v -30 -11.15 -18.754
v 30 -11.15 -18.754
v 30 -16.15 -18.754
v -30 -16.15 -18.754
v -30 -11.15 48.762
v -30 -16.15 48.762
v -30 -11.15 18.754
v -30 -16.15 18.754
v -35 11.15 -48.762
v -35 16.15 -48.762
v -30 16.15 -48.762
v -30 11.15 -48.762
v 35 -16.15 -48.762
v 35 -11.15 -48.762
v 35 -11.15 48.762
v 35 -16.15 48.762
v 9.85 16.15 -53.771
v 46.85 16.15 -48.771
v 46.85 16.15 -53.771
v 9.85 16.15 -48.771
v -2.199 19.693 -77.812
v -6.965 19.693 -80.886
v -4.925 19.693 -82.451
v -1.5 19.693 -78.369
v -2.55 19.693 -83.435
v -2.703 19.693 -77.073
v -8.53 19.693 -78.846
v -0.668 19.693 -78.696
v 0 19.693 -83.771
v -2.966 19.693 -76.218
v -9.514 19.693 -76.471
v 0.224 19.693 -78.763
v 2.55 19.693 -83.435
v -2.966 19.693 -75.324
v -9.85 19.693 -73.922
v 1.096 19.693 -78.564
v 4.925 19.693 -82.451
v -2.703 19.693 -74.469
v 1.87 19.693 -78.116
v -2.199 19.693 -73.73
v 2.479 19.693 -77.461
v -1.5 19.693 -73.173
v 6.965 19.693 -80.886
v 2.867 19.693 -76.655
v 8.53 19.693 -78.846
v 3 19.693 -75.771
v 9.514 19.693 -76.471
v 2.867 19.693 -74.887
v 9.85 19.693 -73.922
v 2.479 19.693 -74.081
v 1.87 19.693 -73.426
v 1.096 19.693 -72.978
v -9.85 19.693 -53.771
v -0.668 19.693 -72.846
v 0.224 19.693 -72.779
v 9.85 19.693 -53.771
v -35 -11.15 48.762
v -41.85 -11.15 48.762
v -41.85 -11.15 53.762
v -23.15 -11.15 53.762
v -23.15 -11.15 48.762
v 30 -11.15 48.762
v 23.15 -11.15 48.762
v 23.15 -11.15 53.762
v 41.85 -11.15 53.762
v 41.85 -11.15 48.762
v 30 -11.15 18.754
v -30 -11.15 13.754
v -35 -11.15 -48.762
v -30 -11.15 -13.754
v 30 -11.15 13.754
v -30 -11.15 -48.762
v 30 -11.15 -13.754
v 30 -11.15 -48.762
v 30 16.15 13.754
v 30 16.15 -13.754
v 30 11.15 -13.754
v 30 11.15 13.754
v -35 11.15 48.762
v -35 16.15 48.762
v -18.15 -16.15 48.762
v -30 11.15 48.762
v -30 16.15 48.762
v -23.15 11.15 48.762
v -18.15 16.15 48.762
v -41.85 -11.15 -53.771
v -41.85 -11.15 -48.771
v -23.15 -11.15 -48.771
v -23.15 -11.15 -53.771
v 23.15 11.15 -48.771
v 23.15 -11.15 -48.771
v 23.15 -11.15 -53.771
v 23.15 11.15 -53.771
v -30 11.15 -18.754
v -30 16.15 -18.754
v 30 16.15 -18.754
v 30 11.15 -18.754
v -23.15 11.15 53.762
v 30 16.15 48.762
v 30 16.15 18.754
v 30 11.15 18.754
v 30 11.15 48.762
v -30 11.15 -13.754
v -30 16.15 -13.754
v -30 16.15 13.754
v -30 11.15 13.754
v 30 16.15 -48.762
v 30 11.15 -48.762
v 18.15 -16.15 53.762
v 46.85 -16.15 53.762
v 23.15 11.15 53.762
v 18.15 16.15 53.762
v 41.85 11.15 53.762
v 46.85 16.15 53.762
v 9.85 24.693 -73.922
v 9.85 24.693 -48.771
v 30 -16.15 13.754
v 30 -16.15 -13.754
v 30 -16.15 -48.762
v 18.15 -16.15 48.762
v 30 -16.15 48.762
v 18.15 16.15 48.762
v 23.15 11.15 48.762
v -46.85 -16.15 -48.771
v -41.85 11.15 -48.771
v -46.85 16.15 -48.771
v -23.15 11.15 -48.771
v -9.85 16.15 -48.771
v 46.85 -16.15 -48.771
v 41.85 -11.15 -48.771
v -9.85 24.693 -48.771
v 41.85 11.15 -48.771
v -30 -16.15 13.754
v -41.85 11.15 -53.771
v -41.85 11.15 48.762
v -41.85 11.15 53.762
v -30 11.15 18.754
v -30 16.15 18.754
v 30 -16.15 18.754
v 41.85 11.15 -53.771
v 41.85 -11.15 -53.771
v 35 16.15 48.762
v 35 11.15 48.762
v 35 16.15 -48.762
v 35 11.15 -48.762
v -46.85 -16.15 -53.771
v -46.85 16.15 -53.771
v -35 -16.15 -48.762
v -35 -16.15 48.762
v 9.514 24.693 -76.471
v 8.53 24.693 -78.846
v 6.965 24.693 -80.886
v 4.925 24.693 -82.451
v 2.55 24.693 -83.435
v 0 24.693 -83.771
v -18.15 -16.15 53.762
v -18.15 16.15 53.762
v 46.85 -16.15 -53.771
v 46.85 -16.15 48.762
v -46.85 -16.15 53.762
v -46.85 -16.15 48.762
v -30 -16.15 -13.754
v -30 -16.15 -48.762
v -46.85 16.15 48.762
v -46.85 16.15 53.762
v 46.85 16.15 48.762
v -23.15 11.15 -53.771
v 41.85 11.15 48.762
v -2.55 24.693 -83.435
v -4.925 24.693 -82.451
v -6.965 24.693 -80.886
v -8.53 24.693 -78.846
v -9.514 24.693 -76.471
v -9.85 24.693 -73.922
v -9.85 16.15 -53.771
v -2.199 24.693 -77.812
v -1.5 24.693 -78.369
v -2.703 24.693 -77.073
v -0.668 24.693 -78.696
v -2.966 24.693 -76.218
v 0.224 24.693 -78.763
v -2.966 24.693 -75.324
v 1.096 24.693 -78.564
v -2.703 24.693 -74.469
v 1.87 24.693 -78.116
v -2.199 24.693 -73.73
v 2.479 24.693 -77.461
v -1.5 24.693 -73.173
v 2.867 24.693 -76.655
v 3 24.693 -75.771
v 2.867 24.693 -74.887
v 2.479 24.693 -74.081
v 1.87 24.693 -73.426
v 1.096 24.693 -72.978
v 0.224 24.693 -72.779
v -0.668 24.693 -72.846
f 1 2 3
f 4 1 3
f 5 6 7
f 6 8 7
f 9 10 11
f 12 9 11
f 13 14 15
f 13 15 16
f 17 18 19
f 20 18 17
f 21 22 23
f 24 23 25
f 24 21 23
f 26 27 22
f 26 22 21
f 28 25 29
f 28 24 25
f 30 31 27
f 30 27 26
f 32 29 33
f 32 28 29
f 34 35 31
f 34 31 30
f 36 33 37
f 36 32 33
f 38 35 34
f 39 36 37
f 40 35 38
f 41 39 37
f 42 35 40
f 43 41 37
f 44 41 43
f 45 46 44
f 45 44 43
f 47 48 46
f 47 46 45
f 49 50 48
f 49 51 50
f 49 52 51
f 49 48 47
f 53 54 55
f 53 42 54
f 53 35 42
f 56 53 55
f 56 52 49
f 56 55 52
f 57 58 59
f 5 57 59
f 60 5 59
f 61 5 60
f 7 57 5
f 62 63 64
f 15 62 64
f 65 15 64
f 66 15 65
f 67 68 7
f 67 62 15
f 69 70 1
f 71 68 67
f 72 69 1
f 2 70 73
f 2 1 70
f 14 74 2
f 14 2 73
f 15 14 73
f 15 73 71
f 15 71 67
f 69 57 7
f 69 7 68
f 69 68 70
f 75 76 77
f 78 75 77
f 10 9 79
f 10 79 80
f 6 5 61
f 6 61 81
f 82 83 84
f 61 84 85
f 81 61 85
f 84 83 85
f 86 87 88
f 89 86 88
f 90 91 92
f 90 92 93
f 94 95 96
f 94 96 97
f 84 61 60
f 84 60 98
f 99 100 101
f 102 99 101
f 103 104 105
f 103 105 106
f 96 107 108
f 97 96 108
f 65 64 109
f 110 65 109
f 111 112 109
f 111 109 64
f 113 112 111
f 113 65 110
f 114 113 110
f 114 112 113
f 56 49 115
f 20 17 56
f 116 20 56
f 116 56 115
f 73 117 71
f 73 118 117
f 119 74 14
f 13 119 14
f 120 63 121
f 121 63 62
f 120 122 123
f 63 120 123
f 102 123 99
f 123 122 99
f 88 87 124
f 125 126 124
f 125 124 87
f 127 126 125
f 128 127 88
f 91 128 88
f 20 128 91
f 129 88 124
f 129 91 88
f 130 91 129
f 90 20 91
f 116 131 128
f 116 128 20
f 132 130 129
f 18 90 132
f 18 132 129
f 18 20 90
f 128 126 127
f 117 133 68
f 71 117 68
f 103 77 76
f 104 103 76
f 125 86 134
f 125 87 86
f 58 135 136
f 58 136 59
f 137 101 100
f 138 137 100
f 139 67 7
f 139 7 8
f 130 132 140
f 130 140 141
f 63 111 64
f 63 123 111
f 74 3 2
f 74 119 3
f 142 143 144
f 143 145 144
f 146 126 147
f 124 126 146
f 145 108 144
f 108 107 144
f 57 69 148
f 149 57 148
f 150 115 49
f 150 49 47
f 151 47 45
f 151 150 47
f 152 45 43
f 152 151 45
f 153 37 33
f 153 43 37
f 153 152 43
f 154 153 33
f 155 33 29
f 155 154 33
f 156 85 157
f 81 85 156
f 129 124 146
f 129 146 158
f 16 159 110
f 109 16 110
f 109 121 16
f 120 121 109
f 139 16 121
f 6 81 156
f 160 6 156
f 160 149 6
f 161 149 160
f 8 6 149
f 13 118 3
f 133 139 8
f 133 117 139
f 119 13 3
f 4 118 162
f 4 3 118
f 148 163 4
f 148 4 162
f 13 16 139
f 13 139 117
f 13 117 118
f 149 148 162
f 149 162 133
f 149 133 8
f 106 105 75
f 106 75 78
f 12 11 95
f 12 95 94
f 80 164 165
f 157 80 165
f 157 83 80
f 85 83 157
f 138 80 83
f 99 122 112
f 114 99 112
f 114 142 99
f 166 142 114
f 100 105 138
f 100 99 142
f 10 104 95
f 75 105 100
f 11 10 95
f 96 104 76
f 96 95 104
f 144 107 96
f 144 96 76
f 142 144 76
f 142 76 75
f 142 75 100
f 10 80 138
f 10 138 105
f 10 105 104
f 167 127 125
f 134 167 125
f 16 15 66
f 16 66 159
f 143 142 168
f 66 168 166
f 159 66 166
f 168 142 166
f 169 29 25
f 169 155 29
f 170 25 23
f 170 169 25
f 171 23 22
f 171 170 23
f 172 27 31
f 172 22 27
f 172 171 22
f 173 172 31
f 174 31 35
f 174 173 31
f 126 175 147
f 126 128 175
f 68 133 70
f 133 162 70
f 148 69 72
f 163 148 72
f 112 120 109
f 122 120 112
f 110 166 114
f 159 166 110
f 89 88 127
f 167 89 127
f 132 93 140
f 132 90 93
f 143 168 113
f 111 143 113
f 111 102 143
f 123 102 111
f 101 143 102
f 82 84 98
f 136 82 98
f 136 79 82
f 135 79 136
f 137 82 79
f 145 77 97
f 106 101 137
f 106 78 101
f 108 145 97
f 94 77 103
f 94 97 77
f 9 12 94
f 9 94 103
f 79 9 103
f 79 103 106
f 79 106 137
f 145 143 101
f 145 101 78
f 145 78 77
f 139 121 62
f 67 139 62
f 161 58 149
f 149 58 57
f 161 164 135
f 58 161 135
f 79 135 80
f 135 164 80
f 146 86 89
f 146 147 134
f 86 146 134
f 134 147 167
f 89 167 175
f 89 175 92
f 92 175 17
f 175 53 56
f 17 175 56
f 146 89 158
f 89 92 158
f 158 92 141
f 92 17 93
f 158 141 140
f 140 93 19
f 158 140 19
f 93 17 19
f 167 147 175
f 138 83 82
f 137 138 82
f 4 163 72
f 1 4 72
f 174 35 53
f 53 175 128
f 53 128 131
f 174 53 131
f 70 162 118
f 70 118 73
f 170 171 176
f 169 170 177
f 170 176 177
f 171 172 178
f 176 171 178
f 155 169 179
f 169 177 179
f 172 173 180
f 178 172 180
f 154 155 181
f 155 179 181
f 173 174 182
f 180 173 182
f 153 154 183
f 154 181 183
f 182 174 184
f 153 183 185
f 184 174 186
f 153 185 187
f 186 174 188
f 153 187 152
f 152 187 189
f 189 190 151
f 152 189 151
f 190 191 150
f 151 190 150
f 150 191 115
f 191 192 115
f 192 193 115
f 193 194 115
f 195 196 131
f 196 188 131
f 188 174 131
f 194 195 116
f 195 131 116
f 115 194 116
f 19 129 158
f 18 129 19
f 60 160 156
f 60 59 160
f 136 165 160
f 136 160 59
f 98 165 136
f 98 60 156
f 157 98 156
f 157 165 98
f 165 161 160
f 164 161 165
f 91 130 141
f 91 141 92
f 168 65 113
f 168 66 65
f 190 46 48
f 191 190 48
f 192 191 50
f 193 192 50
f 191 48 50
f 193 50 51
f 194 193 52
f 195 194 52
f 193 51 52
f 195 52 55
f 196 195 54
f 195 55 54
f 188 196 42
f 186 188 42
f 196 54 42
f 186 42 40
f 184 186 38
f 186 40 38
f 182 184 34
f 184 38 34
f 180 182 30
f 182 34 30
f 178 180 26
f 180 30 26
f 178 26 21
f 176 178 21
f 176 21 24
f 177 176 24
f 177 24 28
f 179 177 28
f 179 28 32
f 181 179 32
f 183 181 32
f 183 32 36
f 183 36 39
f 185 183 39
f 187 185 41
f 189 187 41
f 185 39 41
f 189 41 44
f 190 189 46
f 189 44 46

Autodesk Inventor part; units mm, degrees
ref_plane "YZ Plane" through (0, 0, 0) normal (1, 0, 0) x (0, 1, 0)
sketch "Sketch1" plane through (0, 0, 0) normal (0, 0, 1) x (1, 0, 0)
  line L0 (-30, 11.15) -> (30, 11.15) construction
  line L1 (30, 11.15) -> (30, -11.15) construction
  line L2 (30, -11.15) -> (-30, -11.15) construction
  line L3 (-30, -11.15) -> (-30, 11.15) construction
  line L4 (-30, 11.15) -> (30, -11.15) construction
  line L5 (30, 11.15) -> (-30, -11.15) construction
  line L6 (-30, 11.15) -> (-35, 11.15)
  line L7 (-35, 11.15) -> (-35, 16.15)
  line L8 (-35, 16.15) -> (-30, 16.15)
  line L9 (-30, 16.15) -> (-30, 11.15)
  line L10 (30, 11.15) -> (35, 11.15)
  line L11 (35, 11.15) -> (35, 16.15)
  line L12 (35, 16.15) -> (30, 16.15)
  line L13 (30, 16.15) -> (30, 11.15)
  line L14 (30, -11.15) -> (35, -11.15)
  line L15 (35, -11.15) -> (35, -16.15)
  line L16 (35, -16.15) -> (30, -16.15)
  line L17 (30, -16.15) -> (30, -11.15)
  line L18 (-30, -11.15) -> (-35, -11.15)
  line L19 (-35, -11.15) -> (-35, -16.15)
  line L20 (-35, -16.15) -> (-30, -16.15)
  line L21 (-30, -16.15) -> (-30, -11.15)
  point P0 (0, 0)
  dimension "d0" = 60
  dimension "d1" = 22.3
  dimension "d2" = 5
  dimension "d3" = 5
  dimension "d4" = 5
  dimension "d5" = 5
  dimension "d6" = 5
  dimension "d7" = 5
  dimension "d8" = 5
  dimension "d9" = 5
extrude "Extrusion1" add sketch "Sketch1" along normal mid plane 97.524
ref_plane "Work Plane1" through (0, 0, 48.762) normal (0, 0, 1) x (1, 0, 0)
sketch "Sketch2" plane through (0, 0, 48.762) normal (0, 0, 1) x (1, 0, 0)
  line L0 (0, 0) -> (-32.5, 0) construction
  line L1 (0, 0) -> (32.5, 0) construction
  line L2 (-46.85, 16.15) -> (-18.15, 16.15)
  line L3 (-18.15, 16.15) -> (-18.15, -16.15)
  line L4 (-18.15, -16.15) -> (-46.85, -16.15)
  line L5 (-46.85, -16.15) -> (-46.85, 16.15)
  line L6 (-46.85, 16.15) -> (-18.15, -16.15) construction
  line L7 (-18.15, 16.15) -> (-46.85, -16.15) construction
  line L8 (18.15, 16.15) -> (46.85, 16.15)
  line L9 (46.85, 16.15) -> (46.85, -16.15)
  line L10 (46.85, -16.15) -> (18.15, -16.15)
  line L11 (18.15, -16.15) -> (18.15, 16.15)
  line L12 (18.15, 16.15) -> (46.85, -16.15) construction
  line L13 (46.85, 16.15) -> (18.15, -16.15) construction
  line L14 (-23.15, 11.15) -> (-41.85, 11.15)
  line L15 (-41.85, 11.15) -> (-41.85, -11.15)
  line L16 (-41.85, -11.15) -> (-23.15, -11.15)
  line L17 (-23.15, -11.15) -> (-23.15, 11.15)
  line L18 (41.85, 11.15) -> (23.15, 11.15)
  line L19 (23.15, 11.15) -> (23.15, -11.15)
  line L20 (23.15, -11.15) -> (41.85, -11.15)
  line L21 (41.85, -11.15) -> (41.85, 11.15)
  dimension "d13" = 32.5
  dimension "d14" = 32.5
  dimension "d15" = 28.7
  dimension "d16" = 32.3
  dimension "d17" = 28.7
  dimension "d18" = 32.3
  dimension "d19" = 5
  dimension "d20" = 5
extrude "Extrusion2" add sketch "Sketch2" along normal blind 5
ref_plane "Work Plane2" through (0, 0, -48.771) normal (0, 0, 1) x (1, 0, 0)
sketch "Sketch4" plane through (0, 0, 0) normal (1, 0, 0) x (0, 1, 0)
  line L0 (11.15, -48.762) -> (11.15, 48.762) projected
  line L1 (11.15, 18.754) -> (16.15, 18.754)
  line L2 (16.15, 18.754) -> (16.15, 13.754)
  line L3 (16.15, 13.754) -> (11.15, 13.754)
  line L4 (11.15, 13.754) -> (11.15, 18.754)
  line L5 (-16.15, 48.762) -> (16.15, 48.762) projected
  line L6 (11.15, -13.754) -> (16.15, -13.754)
  line L7 (16.15, -13.754) -> (16.15, -18.754)
  line L8 (16.15, -18.754) -> (11.15, -18.754)
  line L9 (11.15, -18.754) -> (11.15, -13.754)
  line L10 (16.15, -48.762) -> (11.15, -48.762) projected
  line L11 (-11.15, 48.762) -> (-11.15, -48.762) projected
  line L12 (-11.15, 18.754) -> (-16.15, 18.754)
  line L13 (-16.15, 18.754) -> (-16.15, 13.754)
  line L14 (-16.15, 13.754) -> (-11.15, 13.754)
  line L15 (-11.15, 13.754) -> (-11.15, 18.754)
  line L16 (-11.15, -18.754) -> (-16.15, -18.754)
  line L17 (-16.15, -18.754) -> (-16.15, -13.754)
  line L18 (-16.15, -13.754) -> (-11.15, -13.754)
  line L19 (-11.15, -13.754) -> (-11.15, -18.754)
  line L20 (-11.15, -48.762) -> (-16.15, -48.762) projected
  point P0 (0, 0)
  dimension "d30" = 5
  dimension "d31" = 5
  dimension "d32" = 30.008
  dimension "d33" = 5
  dimension "d34" = 5
  dimension "d35" = 30.008
  dimension "d36" = 5
  dimension "d37" = 5
  dimension "d38" = 5
  dimension "d39" = 5
  dimension "d40" = 30.008
  dimension "d41" = 30.008
extrude "Extrusion4" add sketch "Sketch4" along normal mid plane 60
sketch "Sketch7" plane through (0, 0, -48.771) normal (0, 0, 1) x (1, 0, 0)
  line L0 (-46.85, -16.15) -> (-18.15, -16.15) projected
  line L1 (46.85, 16.15) -> (-46.85, 16.15)
  line L2 (-46.85, 16.15) -> (-46.85, -16.15)
  line L3 (-46.85, -16.15) -> (46.85, -16.15)
  line L4 (46.85, -16.15) -> (46.85, 16.15)
  line L5 (46.85, 16.15) -> (-46.85, -16.15) construction
  line L6 (-46.85, 16.15) -> (46.85, -16.15) construction
  line L7 (0, 0) -> (32.5, 0) construction
  line L8 (0, 0) -> (-32.5, 0) construction
  line L9 (41.85, -11.15) -> (23.15, -11.15) projected
  line L10 (23.15, 11.15) -> (41.85, 11.15)
  line L11 (41.85, 11.15) -> (41.85, -11.15)
  line L12 (41.85, -11.15) -> (23.15, -11.15)
  line L13 (23.15, -11.15) -> (23.15, 11.15)
  line L14 (23.15, 11.15) -> (41.85, -11.15) construction
  line L15 (41.85, 11.15) -> (23.15, -11.15) construction
  line L16 (-41.85, -11.15) -> (-41.85, 11.15) projected
  line L17 (-23.15, 11.15) -> (-41.85, 11.15)
  line L18 (-41.85, 11.15) -> (-41.85, -11.15)
  line L19 (-41.85, -11.15) -> (-23.15, -11.15)
  line L20 (-23.15, -11.15) -> (-23.15, 11.15)
  line L21 (-23.15, 11.15) -> (-41.85, -11.15) construction
  line L22 (-41.85, 11.15) -> (-23.15, -11.15) construction
  line L23 (0, 0) -> (0, 24.693) construction
  line L24 (0, 24.693) -> (9.85, 24.693) construction
  line L25 (9.85, 24.693) -> (-9.85, 24.693)
  line L26 (-9.85, 24.693) -> (-9.85, 16.15)
  line L27 (-9.85, 16.15) -> (9.85, 16.15)
  line L28 (9.85, 16.15) -> (9.85, 24.693)
  dimension "d61" = 32.5
  dimension "d62" = 32.5
  dimension "d63" = 24.693
  dimension "d64" = 9.85
  dimension "d65" = 19.7
extrude "Extrusion7" add sketch "Sketch7" against normal blind 5
sketch "Sketch8" plane through (0, 0, -53.771) normal (0, 0, -1) x (-1, 0, 0)
  line L0 (9.85, 24.693) -> (-9.85, 24.693) projected
  line L1 (9.85, 16.15) -> (9.85, 24.693) projected
  line L2 (-9.85, 24.693) -> (9.85, 24.693)
  line L3 (9.85, 24.693) -> (9.85, 19.693)
  line L4 (9.85, 19.693) -> (-9.85, 19.693)
  line L5 (-9.85, 19.693) -> (-9.85, 24.693)
  point P0 (0, 0)
  dimension "d68" = 5
extrude "Extrusion8" add sketch "Sketch8" along normal blind 30
fillet "Fillet2" radius 9.85 2 edges at (9.85, 22.193, -83.771) (-9.85, 22.193, -83.771)
sketch "Sketch9" plane through (-9.85, 19.693, -53.771) normal (0, -1, 0) x (1, 0, 0)
  line L0 (56.7, 0) -> (-37, 0) projected
  line L1 (9.85, 0) -> (9.85, -30) construction
  arc A0 (0, -20.15) -> (19.7, -20.15) centre (9.85, -20.15) ccw projected
  circle A1 centre (9.85, -22) radius 3
  point P0 (9.85, 53.771)
  dimension "d72" = 6
  dimension "d73" = 22
extrude "Extrusion9" cut sketch "Sketch9" against normal through all
properties part number "MHead"
